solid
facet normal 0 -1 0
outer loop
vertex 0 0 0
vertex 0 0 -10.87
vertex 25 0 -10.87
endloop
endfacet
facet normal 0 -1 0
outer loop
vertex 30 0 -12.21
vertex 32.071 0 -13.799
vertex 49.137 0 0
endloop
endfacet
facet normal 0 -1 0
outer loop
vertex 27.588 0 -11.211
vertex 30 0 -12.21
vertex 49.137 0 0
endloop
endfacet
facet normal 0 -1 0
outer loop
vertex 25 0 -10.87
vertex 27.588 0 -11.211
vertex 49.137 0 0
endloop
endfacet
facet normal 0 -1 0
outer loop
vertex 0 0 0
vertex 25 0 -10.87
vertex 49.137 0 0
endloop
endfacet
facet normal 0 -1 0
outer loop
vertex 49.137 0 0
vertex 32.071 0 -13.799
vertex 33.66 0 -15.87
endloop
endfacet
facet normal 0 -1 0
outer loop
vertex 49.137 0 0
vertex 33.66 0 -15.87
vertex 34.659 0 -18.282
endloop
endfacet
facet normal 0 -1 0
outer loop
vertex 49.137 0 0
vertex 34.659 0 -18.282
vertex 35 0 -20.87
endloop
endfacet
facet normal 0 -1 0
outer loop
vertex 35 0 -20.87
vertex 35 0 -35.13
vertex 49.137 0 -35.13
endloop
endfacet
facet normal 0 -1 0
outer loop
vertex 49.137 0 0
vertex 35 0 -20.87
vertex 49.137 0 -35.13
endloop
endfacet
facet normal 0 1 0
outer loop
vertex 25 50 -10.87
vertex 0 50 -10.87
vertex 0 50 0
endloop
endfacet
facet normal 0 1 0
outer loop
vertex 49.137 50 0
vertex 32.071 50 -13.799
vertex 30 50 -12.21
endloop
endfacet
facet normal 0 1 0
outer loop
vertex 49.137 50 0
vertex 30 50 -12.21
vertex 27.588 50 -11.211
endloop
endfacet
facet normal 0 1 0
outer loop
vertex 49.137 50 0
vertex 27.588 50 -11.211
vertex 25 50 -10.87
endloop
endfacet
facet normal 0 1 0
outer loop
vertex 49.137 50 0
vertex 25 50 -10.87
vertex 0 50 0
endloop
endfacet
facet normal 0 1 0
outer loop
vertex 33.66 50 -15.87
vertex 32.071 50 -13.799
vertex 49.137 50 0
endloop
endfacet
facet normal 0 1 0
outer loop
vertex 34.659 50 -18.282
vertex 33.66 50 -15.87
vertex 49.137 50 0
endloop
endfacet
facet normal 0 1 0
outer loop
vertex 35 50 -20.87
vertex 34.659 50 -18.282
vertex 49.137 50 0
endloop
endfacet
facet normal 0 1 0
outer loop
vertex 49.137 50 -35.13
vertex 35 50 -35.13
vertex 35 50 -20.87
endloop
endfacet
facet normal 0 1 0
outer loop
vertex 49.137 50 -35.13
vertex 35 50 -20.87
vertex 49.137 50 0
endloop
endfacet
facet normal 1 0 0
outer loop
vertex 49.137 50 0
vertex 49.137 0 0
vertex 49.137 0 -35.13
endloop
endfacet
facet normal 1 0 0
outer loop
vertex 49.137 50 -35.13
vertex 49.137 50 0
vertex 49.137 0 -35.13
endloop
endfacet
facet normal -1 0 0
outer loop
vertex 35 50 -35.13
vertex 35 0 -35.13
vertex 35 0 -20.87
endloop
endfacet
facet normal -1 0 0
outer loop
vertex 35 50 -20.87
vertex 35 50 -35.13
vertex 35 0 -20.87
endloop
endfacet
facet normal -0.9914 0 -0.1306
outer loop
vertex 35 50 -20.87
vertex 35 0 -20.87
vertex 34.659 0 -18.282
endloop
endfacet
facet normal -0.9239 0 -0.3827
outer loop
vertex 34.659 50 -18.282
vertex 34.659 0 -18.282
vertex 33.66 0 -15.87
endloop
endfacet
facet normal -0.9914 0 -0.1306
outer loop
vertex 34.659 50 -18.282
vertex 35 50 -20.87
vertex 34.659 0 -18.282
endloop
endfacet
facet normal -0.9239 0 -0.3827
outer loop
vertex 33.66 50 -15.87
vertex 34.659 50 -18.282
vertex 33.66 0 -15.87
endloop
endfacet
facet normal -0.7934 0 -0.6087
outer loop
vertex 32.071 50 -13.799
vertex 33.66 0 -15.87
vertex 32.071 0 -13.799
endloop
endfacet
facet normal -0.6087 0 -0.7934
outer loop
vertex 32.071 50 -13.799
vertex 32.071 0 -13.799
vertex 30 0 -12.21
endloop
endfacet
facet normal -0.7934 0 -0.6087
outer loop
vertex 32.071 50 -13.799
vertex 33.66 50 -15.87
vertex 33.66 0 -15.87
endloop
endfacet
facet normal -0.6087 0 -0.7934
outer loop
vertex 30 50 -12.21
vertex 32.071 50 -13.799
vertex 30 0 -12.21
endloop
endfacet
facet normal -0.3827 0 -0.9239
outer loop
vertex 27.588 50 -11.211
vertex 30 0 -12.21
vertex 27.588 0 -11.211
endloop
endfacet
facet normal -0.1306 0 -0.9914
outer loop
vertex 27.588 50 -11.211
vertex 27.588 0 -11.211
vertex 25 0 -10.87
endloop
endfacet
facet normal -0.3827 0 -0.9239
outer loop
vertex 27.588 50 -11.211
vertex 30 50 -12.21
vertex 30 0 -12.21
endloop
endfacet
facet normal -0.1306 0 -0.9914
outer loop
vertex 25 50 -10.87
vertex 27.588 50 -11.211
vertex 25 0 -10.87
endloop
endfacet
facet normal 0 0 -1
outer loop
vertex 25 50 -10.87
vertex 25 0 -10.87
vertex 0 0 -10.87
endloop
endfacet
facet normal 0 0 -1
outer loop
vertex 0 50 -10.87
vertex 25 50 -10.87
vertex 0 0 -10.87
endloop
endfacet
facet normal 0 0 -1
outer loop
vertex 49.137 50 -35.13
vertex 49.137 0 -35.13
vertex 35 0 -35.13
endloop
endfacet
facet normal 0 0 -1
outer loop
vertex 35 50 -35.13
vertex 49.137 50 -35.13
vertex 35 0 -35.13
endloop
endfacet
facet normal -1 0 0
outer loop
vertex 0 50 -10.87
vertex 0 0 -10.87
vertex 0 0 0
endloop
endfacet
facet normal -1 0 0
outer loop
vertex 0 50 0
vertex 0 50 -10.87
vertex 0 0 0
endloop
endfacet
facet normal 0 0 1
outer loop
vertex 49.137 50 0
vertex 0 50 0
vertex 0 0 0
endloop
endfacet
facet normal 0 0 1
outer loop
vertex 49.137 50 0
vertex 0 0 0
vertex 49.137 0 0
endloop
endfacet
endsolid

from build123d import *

# Parameters (mm, degrees)
BOSS_EXTRUDE1_DEPTH = 50
VARFILLET1_R        = 10


with BuildPart() as part:
    # Sketch1 → Boss-Extrude1 (new body)
    with BuildSketch(Plane(origin=(0, 0, 0), x_dir=(1, 0, 0), z_dir=(0, 1, 0))):
        Polygon((0, 0), (49.1370117, 0), (49.1370117, 35.13023464), (35, 35.13023464), (35, 10.869893229), (0, 10.869893229), align=None)
    extrude(amount=BOSS_EXTRUDE1_DEPTH)

    # VarFillet1
    varfillet1_edges = [part.edges().sort_by_distance(p)[0] for p in [
        (35, 25, -10.869893229),
    ]]
    fillet(varfillet1_edges, radius=VARFILLET1_R)


solid = part.part
